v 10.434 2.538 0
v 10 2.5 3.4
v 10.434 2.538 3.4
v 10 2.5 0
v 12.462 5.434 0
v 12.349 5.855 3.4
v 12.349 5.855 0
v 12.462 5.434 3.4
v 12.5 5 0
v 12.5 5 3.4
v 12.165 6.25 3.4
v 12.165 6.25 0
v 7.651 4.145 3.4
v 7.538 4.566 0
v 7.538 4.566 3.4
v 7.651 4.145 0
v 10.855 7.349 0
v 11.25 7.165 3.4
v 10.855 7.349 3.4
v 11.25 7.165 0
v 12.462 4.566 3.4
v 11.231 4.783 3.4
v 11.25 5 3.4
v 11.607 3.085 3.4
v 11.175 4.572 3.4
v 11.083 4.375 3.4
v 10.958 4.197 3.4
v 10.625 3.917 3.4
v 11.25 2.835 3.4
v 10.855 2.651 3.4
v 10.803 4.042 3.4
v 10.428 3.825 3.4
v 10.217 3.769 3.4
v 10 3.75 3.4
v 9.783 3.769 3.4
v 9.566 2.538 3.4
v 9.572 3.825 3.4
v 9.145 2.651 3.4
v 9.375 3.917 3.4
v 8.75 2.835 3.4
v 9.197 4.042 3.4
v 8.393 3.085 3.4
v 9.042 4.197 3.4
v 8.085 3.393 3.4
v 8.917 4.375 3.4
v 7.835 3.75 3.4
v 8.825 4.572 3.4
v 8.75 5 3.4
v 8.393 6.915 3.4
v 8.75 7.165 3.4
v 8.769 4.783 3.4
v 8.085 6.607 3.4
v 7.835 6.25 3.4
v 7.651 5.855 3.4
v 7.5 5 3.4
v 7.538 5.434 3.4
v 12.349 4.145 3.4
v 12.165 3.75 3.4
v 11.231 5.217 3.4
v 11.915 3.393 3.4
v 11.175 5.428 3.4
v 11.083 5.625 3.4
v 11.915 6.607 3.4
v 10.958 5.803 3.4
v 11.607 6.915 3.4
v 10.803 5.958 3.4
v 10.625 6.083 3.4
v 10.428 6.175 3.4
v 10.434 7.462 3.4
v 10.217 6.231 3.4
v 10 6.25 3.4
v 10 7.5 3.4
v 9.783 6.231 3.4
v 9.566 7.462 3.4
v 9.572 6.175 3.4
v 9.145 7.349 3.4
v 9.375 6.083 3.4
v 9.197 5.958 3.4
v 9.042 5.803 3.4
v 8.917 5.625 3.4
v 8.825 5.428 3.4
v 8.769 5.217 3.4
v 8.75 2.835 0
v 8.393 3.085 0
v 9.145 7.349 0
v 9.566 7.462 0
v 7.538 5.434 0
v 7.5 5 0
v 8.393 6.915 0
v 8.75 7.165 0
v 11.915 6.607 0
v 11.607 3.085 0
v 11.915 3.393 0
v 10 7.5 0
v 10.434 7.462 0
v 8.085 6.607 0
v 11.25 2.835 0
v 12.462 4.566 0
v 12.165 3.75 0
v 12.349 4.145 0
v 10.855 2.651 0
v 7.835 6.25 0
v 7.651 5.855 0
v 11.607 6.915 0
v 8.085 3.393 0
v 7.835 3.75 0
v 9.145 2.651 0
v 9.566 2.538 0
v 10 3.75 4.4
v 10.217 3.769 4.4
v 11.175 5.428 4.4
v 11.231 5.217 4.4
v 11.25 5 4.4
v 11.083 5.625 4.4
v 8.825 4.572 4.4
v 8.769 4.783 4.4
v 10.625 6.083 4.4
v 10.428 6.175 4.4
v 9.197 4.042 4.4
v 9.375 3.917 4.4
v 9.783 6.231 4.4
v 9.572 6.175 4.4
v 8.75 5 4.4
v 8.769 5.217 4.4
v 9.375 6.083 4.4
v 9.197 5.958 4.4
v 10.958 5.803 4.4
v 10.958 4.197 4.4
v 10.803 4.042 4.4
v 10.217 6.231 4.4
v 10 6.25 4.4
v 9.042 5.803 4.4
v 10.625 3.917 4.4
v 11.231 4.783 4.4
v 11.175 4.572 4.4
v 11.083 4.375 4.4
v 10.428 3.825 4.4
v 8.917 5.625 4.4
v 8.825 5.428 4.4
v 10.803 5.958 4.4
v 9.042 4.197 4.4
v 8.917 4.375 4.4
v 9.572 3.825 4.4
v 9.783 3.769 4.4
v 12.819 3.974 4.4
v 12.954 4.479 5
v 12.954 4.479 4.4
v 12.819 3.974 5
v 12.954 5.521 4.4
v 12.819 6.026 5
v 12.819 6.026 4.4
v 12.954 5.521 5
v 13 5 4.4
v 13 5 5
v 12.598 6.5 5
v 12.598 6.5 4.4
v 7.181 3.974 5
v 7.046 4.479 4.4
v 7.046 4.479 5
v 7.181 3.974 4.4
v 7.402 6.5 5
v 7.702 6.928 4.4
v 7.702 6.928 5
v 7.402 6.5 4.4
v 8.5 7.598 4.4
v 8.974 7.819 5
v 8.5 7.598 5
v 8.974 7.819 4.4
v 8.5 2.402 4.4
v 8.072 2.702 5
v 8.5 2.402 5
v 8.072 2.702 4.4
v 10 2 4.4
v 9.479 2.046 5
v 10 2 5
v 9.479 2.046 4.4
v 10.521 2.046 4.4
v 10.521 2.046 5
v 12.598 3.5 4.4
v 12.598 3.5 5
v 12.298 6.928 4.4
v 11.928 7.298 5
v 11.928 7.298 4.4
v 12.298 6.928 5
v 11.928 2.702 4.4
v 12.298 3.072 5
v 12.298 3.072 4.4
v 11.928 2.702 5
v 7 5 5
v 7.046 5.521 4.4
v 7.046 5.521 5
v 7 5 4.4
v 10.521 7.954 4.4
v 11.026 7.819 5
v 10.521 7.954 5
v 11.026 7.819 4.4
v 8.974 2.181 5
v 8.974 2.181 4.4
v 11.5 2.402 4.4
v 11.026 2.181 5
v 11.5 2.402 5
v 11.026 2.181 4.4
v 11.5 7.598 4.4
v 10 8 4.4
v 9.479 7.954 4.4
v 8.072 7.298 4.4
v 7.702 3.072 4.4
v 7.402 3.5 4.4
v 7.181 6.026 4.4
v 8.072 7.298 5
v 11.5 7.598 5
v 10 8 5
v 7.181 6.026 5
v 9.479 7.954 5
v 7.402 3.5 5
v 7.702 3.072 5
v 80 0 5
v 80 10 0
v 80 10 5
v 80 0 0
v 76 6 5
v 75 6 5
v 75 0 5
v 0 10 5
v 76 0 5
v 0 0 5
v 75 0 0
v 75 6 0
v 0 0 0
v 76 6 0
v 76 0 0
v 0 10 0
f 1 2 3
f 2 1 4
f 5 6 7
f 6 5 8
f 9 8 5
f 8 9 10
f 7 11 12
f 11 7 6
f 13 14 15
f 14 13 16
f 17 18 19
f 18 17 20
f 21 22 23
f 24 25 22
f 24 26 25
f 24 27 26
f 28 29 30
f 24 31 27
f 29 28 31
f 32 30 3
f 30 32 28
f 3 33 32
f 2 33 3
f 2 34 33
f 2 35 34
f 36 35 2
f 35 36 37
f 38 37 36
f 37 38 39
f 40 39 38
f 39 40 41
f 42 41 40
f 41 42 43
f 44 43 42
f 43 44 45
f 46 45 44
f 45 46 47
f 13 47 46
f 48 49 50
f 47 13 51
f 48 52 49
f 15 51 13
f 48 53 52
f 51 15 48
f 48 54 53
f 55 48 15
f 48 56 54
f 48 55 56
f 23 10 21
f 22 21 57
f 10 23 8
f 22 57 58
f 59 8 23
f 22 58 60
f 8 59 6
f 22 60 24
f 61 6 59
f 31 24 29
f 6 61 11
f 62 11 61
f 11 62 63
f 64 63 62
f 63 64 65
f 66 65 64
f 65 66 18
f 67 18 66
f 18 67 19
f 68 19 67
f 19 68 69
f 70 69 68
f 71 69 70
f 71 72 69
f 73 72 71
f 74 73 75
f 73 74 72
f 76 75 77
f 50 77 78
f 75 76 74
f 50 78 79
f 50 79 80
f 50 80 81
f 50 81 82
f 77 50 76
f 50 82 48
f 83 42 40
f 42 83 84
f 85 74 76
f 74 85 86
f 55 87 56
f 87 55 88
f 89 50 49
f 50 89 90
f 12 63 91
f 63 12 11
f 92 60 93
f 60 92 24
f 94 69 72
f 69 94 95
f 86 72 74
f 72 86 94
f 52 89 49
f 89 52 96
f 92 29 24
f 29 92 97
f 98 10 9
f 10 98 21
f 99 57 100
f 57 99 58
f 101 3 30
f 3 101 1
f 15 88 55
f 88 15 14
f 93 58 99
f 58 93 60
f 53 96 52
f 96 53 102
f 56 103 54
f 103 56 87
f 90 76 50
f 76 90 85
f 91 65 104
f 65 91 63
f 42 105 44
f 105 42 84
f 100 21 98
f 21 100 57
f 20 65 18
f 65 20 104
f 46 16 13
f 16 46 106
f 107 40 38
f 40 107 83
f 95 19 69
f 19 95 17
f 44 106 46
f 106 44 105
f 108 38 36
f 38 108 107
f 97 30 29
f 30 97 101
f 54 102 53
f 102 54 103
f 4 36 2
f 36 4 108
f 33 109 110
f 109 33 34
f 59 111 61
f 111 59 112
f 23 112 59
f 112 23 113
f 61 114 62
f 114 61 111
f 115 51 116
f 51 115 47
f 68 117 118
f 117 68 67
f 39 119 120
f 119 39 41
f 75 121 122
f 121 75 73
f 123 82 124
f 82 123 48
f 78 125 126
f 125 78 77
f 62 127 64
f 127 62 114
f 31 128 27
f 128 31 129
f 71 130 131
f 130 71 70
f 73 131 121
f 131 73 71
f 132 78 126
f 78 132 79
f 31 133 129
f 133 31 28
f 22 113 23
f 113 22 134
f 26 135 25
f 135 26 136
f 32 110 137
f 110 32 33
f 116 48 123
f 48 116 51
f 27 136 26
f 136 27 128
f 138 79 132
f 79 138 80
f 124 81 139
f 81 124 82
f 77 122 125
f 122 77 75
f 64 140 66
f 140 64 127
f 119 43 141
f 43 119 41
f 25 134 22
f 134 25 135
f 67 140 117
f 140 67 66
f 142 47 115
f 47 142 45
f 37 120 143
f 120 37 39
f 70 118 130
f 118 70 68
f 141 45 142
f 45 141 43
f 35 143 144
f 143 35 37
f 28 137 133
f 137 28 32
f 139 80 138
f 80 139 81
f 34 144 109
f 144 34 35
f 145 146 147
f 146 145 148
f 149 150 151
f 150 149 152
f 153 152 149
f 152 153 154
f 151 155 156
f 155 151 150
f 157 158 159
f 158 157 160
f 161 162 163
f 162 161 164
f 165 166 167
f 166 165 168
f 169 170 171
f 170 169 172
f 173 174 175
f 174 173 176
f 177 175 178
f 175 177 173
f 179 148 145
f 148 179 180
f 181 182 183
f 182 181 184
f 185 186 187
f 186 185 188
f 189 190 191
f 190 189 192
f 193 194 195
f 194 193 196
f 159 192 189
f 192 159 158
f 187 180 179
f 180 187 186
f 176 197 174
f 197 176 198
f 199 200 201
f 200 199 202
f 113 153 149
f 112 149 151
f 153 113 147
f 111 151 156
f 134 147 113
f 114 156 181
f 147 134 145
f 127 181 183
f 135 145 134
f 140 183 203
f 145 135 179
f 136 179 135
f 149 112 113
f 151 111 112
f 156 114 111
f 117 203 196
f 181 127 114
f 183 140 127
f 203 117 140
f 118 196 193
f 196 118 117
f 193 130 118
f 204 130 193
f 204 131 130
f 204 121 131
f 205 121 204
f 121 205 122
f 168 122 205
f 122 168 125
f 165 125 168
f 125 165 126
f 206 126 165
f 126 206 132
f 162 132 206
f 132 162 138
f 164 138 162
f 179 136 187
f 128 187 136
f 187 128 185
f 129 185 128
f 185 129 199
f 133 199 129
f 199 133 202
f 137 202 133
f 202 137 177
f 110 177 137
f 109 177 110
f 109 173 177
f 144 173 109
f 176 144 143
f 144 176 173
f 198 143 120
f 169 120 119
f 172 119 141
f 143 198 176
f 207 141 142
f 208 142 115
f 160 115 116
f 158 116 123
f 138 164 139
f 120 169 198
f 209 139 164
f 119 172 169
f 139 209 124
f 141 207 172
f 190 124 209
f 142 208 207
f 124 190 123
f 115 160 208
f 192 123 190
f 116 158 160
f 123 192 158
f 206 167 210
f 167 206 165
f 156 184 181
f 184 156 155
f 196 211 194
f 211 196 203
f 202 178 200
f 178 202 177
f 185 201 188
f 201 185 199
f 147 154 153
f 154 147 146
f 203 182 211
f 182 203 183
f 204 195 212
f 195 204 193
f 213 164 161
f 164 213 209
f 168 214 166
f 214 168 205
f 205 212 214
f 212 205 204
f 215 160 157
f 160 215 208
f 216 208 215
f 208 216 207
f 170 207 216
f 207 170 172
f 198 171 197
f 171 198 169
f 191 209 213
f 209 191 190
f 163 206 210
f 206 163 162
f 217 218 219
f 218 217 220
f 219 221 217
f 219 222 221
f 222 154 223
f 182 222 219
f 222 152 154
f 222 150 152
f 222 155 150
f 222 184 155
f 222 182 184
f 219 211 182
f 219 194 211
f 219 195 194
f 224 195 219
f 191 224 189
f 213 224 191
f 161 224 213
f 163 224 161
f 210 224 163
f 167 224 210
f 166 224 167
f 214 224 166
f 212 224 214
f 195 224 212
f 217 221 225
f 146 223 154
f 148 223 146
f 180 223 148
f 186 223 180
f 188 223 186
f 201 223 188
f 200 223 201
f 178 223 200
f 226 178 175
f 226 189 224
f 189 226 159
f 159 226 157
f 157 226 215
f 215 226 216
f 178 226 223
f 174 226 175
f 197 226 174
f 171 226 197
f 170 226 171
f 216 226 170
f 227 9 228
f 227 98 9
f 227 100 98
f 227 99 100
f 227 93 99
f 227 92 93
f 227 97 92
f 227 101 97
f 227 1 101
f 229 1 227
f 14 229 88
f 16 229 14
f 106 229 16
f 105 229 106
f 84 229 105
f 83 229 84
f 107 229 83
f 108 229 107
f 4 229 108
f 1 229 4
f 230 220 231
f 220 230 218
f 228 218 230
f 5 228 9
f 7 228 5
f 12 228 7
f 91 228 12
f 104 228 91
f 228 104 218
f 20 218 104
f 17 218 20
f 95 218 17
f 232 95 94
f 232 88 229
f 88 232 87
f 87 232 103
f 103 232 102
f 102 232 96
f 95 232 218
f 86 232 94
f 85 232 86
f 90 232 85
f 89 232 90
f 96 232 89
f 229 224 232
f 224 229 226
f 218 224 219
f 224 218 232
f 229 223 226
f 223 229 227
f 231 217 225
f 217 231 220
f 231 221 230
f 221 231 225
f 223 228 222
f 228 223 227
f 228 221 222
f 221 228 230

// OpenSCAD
//---------------------------------------------------------------------------------------------
//-- Printable servo tea bot
//-- (c) Martin Korinek	m.ko@inode.at
//-- April-2015
//---------------------------------------------------------------------------------------------
//--
//---------------------------------------------------------------------------------------------

//fragment minimum angle
  $fa=10.0;

//fragment minimum size
  $fs=0.2;
  
  ArmHeigth =5;
  ArmWidth =10;
  ArmLength = 80; 

	difference()
	{  
		union()
		{
			cube([ArmLength,ArmWidth,ArmHeigth]);
			//translate([-15,-15,0])
				//big weigth cube
				//cube([40,30,ArmHeigth]);
		}
		translate([10,ArmWidth/2,-0.1])
		{	
			#cylinder(h=ArmHeigth-1.5,d=5);
			#cylinder(h=ArmHeigth+2,d=2.5);
			translate([0,0,ArmHeigth-0.5])
				#cylinder(h=ArmHeigth+2,d=6);
		}
		translate([ArmLength-5,-2,-0.1])
			#cube([1,8,ArmHeigth+1]);
	}
